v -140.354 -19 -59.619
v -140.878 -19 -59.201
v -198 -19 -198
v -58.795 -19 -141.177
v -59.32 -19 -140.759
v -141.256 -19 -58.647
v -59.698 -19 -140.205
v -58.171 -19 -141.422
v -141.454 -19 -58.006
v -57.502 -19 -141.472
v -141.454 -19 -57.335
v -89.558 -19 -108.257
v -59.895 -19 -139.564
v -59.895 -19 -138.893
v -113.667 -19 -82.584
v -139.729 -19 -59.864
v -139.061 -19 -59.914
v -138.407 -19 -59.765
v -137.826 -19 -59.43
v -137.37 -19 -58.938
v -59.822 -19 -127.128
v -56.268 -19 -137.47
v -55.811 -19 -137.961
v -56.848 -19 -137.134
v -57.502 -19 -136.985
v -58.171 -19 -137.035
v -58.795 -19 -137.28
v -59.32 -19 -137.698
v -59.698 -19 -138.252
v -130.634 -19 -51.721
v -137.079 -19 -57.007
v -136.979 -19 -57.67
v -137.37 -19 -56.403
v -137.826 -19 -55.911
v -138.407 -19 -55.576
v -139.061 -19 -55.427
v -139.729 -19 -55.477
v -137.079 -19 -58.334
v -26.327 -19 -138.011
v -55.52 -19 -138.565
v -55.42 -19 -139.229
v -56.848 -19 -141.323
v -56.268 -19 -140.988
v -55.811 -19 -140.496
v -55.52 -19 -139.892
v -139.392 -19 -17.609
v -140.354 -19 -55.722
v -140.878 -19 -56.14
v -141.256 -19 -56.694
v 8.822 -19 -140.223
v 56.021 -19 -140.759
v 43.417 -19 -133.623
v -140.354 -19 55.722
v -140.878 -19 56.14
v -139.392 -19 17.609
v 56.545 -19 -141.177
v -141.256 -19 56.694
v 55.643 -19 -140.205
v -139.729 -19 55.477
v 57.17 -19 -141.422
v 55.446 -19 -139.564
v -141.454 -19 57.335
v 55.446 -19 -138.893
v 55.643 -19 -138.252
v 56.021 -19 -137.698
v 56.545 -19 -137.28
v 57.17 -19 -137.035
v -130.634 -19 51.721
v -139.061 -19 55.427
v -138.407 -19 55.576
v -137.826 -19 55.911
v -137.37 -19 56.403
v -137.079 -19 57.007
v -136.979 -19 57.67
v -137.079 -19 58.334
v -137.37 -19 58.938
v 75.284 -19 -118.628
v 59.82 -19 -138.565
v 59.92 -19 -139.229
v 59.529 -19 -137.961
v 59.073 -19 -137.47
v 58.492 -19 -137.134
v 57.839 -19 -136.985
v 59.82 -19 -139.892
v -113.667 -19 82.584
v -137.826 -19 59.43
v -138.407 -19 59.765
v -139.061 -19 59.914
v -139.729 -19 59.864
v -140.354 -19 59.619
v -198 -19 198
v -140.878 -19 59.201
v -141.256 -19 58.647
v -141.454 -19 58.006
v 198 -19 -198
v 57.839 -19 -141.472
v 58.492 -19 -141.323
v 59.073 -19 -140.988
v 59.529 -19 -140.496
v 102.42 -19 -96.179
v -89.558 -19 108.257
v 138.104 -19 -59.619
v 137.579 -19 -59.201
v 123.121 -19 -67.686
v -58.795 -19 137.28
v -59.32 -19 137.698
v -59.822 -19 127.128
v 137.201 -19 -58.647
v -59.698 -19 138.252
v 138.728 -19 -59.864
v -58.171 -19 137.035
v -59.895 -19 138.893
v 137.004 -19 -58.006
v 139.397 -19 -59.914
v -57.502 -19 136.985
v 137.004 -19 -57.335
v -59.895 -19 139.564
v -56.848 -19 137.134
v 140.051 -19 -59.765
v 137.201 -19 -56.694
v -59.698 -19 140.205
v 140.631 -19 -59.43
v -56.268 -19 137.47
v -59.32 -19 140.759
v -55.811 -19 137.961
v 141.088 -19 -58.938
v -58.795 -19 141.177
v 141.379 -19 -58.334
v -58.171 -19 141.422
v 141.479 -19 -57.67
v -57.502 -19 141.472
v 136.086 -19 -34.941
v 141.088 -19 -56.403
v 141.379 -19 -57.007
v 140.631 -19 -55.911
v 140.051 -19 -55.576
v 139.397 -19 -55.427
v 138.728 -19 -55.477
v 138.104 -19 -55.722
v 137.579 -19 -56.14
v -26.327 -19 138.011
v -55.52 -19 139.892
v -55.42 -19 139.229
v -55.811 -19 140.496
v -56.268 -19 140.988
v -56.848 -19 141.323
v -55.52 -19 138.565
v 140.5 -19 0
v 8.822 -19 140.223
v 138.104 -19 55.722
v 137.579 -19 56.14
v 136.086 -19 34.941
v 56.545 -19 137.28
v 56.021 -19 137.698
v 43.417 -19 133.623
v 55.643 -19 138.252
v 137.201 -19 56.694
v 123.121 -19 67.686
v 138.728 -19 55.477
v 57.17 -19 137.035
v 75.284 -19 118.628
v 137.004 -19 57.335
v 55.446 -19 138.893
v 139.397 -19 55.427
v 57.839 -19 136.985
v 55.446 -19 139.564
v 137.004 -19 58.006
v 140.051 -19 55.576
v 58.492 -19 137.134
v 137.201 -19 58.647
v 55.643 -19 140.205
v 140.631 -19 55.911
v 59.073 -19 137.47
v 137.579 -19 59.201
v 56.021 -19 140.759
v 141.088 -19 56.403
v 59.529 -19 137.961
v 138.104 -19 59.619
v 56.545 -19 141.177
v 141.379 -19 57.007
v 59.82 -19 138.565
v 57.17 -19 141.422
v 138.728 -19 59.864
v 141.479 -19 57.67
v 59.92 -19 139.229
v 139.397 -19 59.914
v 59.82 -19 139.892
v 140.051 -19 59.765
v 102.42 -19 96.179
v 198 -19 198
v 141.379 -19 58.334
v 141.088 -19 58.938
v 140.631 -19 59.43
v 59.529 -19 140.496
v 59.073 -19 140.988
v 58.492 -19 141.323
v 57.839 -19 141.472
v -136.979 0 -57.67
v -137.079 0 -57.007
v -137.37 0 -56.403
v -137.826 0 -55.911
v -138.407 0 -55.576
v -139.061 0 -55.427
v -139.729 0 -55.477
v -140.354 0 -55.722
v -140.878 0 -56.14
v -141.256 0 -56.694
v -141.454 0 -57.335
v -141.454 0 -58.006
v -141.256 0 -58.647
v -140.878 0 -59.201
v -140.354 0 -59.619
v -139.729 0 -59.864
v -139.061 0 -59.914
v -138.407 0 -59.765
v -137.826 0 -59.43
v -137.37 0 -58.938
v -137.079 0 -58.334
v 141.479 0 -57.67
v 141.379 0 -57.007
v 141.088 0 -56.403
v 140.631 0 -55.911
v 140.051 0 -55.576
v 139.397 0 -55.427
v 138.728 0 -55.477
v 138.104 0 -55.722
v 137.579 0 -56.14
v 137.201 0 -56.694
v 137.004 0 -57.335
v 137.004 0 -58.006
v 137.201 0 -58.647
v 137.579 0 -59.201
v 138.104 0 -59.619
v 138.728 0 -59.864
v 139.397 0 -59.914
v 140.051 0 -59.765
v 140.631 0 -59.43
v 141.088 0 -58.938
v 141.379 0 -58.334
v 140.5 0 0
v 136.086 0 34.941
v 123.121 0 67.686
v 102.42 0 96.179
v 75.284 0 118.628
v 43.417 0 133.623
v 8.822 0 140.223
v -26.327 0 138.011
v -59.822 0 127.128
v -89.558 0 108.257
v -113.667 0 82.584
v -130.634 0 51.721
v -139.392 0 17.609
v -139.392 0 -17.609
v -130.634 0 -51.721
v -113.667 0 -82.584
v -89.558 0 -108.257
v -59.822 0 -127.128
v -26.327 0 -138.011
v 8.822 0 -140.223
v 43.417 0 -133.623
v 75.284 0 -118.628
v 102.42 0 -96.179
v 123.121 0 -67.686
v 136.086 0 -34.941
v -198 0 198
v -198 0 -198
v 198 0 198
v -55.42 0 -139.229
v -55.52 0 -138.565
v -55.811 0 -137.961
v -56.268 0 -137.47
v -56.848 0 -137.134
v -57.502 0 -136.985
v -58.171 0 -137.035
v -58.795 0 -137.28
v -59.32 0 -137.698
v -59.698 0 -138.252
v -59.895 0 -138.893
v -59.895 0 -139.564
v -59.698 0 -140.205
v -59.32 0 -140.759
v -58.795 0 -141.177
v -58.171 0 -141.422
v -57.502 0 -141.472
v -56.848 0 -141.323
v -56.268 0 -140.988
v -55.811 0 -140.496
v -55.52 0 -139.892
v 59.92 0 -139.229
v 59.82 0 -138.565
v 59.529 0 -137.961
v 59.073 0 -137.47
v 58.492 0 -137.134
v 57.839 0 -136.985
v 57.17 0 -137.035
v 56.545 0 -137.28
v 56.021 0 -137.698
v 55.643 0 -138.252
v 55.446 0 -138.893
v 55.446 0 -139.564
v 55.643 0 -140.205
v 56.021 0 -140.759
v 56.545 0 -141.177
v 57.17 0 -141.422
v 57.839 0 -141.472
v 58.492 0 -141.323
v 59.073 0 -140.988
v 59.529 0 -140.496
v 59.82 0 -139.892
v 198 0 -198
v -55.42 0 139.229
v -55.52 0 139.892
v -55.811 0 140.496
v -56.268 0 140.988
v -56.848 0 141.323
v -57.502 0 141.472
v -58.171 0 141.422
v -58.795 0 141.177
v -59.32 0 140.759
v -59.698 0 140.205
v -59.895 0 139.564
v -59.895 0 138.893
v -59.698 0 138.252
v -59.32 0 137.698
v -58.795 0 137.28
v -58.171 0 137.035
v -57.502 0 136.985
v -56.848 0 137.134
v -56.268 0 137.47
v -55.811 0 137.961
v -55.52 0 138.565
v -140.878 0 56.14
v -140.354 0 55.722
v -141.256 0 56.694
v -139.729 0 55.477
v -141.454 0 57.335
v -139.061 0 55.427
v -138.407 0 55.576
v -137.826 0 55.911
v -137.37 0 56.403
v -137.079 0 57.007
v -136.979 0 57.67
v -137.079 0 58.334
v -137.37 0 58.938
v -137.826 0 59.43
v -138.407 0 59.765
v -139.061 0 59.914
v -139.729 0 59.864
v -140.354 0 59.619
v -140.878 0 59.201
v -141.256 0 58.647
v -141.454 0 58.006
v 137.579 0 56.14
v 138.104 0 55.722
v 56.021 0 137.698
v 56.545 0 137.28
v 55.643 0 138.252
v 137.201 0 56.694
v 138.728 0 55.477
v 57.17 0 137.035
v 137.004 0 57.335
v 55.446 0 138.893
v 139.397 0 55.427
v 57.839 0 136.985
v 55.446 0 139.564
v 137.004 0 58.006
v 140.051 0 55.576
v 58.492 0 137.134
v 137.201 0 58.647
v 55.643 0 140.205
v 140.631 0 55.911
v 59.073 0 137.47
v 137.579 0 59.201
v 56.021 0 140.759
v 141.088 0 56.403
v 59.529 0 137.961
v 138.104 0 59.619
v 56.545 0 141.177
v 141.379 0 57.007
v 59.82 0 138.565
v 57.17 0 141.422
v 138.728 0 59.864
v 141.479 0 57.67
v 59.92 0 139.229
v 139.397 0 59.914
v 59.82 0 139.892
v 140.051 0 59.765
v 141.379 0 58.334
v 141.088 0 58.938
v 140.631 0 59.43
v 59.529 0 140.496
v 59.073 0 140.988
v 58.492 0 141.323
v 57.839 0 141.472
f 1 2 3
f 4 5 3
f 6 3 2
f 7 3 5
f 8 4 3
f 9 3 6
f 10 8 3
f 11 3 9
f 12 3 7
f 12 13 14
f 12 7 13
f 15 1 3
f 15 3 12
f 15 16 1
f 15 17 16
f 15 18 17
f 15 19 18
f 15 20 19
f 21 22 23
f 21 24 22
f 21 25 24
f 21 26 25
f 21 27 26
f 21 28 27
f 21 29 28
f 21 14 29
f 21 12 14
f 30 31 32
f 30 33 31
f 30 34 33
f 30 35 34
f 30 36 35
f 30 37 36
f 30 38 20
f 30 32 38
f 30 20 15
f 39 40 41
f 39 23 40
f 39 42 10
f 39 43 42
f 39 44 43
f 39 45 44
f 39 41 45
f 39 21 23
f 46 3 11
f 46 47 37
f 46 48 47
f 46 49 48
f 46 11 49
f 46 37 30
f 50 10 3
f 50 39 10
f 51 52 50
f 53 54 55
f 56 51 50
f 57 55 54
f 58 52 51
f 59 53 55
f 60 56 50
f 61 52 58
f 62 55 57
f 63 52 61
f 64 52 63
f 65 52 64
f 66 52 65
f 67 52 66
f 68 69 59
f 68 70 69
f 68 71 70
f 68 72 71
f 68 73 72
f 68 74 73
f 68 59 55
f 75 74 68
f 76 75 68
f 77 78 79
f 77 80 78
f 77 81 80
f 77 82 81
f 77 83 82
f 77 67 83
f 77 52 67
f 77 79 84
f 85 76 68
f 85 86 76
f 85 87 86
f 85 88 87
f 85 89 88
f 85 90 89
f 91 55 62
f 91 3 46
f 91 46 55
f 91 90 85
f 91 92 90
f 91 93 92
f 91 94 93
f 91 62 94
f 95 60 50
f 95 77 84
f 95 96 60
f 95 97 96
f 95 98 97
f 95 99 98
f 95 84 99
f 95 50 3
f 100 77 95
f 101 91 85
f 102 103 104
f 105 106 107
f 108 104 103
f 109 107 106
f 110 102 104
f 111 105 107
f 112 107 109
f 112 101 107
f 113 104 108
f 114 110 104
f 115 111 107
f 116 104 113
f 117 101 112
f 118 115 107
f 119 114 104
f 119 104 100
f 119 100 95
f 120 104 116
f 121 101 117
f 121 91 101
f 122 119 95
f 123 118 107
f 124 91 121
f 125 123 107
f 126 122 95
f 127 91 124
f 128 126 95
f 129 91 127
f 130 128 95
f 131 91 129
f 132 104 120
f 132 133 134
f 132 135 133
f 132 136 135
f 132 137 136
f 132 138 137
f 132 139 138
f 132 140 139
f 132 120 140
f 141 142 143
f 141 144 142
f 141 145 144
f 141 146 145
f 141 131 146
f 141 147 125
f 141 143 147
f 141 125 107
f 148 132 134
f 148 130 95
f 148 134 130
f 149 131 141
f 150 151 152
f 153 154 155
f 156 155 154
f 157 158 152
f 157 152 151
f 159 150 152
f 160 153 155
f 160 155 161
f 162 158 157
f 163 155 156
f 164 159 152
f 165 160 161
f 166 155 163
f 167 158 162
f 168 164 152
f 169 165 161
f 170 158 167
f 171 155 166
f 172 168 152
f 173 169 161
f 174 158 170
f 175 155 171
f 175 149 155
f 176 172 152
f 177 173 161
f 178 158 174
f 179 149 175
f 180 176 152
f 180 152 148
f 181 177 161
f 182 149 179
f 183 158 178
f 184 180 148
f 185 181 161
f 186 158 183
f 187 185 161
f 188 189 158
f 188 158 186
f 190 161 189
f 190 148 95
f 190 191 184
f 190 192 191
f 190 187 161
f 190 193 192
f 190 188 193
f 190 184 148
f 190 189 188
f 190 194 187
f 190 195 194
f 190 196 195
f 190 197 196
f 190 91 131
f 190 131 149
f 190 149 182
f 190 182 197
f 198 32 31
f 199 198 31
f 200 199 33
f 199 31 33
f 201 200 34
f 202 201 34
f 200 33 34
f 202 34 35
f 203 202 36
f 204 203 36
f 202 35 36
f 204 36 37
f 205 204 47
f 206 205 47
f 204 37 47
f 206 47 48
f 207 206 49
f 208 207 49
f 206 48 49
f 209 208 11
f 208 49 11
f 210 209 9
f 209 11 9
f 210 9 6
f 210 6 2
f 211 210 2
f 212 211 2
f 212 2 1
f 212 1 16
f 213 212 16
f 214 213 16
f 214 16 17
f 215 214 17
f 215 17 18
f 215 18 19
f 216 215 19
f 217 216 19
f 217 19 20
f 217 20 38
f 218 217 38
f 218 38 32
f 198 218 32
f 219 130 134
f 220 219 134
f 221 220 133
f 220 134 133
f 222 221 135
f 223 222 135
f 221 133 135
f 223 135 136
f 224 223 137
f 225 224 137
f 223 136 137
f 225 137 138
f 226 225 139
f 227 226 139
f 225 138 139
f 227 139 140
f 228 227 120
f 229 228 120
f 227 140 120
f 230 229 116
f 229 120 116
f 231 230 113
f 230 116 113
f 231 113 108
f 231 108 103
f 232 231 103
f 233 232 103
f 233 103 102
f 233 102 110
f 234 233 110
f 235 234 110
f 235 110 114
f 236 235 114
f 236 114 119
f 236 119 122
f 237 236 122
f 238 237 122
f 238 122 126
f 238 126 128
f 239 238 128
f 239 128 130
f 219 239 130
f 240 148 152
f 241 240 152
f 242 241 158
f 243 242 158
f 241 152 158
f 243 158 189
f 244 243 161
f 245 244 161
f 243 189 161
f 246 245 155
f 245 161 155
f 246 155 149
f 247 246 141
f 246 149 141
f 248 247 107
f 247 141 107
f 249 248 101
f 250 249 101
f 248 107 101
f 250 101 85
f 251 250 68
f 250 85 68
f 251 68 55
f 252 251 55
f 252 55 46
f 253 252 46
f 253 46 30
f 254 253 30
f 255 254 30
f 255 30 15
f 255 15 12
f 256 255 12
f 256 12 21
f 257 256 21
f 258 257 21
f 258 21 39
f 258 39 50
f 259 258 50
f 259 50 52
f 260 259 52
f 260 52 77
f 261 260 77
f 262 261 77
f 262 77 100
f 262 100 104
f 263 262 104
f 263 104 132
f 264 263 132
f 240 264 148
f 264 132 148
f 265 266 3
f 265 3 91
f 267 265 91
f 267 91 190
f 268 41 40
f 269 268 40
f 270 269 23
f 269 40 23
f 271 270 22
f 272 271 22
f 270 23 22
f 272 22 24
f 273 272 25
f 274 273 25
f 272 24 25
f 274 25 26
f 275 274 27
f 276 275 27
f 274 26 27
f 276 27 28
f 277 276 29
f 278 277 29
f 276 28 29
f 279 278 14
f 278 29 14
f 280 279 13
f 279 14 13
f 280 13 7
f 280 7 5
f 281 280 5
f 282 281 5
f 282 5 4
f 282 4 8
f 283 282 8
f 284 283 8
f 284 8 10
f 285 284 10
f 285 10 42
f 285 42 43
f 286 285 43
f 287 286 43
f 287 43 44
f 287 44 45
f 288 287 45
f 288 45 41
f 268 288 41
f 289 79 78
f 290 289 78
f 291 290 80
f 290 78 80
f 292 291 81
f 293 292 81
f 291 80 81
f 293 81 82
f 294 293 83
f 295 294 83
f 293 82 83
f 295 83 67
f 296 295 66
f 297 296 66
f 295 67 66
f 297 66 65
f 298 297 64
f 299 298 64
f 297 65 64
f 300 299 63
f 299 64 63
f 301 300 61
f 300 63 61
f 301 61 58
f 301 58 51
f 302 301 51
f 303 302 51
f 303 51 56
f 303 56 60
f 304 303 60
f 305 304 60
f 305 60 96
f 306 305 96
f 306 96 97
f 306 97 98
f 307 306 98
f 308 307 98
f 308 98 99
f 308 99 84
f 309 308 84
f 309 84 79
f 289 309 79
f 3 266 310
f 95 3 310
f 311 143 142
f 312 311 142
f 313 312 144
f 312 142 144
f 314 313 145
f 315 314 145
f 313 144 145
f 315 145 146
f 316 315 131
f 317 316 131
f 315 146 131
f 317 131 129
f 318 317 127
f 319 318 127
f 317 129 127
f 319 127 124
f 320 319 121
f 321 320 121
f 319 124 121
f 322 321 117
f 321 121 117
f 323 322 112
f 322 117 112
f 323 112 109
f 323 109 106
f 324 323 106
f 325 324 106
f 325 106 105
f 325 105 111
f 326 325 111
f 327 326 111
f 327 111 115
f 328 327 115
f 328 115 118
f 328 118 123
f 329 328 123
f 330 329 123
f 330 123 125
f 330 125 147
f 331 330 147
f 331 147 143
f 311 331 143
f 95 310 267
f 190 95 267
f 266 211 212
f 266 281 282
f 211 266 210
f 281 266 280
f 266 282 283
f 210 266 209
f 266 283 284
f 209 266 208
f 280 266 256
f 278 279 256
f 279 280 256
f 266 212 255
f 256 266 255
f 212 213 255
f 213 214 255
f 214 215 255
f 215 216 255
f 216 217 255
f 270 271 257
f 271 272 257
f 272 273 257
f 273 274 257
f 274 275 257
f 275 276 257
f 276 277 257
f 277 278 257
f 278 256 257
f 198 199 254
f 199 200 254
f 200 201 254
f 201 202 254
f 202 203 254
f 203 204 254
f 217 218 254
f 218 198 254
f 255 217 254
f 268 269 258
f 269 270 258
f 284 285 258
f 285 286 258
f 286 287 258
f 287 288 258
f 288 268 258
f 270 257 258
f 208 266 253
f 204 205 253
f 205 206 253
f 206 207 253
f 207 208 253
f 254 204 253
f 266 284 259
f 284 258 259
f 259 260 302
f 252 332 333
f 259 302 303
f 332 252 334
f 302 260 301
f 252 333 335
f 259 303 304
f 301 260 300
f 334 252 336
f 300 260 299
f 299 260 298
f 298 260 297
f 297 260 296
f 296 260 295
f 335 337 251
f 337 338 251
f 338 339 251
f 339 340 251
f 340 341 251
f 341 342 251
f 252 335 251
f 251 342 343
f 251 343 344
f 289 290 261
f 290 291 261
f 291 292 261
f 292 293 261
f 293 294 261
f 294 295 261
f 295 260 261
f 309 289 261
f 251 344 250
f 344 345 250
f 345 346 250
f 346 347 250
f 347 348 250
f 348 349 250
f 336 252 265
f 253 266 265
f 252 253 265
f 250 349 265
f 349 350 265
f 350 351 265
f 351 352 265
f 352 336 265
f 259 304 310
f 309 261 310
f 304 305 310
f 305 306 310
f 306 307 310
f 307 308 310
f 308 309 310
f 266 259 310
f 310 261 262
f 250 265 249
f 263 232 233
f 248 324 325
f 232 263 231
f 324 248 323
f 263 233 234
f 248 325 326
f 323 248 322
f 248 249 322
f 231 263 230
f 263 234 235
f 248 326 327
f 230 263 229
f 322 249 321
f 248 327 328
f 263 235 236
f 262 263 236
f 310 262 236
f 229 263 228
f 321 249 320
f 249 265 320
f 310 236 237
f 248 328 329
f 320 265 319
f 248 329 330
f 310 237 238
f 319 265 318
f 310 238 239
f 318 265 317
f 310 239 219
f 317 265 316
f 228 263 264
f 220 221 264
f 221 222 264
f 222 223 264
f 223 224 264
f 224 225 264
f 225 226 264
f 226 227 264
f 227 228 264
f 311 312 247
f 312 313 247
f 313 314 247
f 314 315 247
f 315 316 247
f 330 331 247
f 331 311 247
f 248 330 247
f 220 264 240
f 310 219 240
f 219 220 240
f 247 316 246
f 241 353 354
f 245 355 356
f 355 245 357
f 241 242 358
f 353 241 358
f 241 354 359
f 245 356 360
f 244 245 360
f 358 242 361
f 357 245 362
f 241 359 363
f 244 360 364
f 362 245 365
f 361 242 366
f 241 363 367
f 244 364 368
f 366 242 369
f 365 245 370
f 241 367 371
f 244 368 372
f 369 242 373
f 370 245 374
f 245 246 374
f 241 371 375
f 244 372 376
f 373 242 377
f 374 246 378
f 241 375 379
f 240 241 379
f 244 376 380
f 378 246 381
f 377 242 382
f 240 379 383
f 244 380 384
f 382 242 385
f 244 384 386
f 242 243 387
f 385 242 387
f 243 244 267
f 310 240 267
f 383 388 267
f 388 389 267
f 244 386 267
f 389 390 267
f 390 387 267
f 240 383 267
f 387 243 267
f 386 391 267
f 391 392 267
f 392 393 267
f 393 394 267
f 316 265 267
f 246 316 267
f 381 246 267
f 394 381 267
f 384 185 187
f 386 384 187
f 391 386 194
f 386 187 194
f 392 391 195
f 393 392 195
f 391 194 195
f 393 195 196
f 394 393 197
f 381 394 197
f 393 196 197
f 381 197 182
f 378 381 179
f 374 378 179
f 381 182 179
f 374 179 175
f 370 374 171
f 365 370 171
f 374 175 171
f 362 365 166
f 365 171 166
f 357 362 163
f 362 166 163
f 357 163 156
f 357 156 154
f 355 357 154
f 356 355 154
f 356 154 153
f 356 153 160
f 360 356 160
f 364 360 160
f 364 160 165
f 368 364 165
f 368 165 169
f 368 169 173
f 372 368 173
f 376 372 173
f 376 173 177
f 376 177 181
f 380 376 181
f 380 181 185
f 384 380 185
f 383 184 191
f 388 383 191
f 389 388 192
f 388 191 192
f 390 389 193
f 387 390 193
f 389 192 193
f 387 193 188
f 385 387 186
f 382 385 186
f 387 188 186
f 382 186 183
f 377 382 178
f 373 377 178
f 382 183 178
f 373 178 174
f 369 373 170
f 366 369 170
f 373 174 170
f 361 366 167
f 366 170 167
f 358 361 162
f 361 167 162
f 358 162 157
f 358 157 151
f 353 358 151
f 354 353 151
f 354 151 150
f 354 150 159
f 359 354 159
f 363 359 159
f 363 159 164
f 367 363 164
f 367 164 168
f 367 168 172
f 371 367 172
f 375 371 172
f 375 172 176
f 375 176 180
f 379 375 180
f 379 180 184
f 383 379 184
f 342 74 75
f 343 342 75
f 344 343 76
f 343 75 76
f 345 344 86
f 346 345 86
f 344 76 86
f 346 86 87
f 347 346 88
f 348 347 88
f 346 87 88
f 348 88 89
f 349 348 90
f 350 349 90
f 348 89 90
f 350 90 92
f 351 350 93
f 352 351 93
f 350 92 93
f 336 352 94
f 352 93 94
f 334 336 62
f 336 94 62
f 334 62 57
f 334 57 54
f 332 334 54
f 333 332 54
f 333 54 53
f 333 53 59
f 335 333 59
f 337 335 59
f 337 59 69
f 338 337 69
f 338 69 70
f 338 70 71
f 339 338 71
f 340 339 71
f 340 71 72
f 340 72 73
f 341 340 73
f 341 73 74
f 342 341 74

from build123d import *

# Parameters (mm, degrees)
F0_W     = 396
F0_H     = 396
F1_DEPTH = 19
F2_R     = 140.5
F3_DEPTH = 25.4
F4_R     = 2.25
F5_DEPTH = 25.4


with BuildPart() as f1:
    # F0 (on Front) → F1 (new body)
    with BuildSketch(Plane.XZ):
        Rectangle(F0_W, F0_H)
    extrude(amount=F1_DEPTH)

    # F2 (on face) → F3 (cut)
    with BuildSketch(Plane.XZ.offset(19)):
        Circle(F2_R)
    extrude(amount=-F3_DEPTH, mode=Mode.SUBTRACT)

    # F4 (on face) → F5 (cut)
    with BuildSketch(Plane.XZ.offset(19)):
        with Locations((57.670393, 139.228646)):
            Circle(F4_R)
        with Locations((139.228646, 57.670393)):
            Circle(F4_R)
        with Locations((139.228646, -57.670393)):
            Circle(F4_R)
        with Locations((57.670393, -139.228646)):
            Circle(F4_R)
        with Locations((-57.670393, -139.228646)):
            Circle(F4_R)
        with Locations((-139.228646, -57.670393)):
            Circle(F4_R)
        with Locations((-139.228646, 57.670393)):
            Circle(F4_R)
        with Locations((-57.670393, 139.228646)):
            Circle(F4_R)
    extrude(amount=-F5_DEPTH, mode=Mode.SUBTRACT)


solid = f1.part
